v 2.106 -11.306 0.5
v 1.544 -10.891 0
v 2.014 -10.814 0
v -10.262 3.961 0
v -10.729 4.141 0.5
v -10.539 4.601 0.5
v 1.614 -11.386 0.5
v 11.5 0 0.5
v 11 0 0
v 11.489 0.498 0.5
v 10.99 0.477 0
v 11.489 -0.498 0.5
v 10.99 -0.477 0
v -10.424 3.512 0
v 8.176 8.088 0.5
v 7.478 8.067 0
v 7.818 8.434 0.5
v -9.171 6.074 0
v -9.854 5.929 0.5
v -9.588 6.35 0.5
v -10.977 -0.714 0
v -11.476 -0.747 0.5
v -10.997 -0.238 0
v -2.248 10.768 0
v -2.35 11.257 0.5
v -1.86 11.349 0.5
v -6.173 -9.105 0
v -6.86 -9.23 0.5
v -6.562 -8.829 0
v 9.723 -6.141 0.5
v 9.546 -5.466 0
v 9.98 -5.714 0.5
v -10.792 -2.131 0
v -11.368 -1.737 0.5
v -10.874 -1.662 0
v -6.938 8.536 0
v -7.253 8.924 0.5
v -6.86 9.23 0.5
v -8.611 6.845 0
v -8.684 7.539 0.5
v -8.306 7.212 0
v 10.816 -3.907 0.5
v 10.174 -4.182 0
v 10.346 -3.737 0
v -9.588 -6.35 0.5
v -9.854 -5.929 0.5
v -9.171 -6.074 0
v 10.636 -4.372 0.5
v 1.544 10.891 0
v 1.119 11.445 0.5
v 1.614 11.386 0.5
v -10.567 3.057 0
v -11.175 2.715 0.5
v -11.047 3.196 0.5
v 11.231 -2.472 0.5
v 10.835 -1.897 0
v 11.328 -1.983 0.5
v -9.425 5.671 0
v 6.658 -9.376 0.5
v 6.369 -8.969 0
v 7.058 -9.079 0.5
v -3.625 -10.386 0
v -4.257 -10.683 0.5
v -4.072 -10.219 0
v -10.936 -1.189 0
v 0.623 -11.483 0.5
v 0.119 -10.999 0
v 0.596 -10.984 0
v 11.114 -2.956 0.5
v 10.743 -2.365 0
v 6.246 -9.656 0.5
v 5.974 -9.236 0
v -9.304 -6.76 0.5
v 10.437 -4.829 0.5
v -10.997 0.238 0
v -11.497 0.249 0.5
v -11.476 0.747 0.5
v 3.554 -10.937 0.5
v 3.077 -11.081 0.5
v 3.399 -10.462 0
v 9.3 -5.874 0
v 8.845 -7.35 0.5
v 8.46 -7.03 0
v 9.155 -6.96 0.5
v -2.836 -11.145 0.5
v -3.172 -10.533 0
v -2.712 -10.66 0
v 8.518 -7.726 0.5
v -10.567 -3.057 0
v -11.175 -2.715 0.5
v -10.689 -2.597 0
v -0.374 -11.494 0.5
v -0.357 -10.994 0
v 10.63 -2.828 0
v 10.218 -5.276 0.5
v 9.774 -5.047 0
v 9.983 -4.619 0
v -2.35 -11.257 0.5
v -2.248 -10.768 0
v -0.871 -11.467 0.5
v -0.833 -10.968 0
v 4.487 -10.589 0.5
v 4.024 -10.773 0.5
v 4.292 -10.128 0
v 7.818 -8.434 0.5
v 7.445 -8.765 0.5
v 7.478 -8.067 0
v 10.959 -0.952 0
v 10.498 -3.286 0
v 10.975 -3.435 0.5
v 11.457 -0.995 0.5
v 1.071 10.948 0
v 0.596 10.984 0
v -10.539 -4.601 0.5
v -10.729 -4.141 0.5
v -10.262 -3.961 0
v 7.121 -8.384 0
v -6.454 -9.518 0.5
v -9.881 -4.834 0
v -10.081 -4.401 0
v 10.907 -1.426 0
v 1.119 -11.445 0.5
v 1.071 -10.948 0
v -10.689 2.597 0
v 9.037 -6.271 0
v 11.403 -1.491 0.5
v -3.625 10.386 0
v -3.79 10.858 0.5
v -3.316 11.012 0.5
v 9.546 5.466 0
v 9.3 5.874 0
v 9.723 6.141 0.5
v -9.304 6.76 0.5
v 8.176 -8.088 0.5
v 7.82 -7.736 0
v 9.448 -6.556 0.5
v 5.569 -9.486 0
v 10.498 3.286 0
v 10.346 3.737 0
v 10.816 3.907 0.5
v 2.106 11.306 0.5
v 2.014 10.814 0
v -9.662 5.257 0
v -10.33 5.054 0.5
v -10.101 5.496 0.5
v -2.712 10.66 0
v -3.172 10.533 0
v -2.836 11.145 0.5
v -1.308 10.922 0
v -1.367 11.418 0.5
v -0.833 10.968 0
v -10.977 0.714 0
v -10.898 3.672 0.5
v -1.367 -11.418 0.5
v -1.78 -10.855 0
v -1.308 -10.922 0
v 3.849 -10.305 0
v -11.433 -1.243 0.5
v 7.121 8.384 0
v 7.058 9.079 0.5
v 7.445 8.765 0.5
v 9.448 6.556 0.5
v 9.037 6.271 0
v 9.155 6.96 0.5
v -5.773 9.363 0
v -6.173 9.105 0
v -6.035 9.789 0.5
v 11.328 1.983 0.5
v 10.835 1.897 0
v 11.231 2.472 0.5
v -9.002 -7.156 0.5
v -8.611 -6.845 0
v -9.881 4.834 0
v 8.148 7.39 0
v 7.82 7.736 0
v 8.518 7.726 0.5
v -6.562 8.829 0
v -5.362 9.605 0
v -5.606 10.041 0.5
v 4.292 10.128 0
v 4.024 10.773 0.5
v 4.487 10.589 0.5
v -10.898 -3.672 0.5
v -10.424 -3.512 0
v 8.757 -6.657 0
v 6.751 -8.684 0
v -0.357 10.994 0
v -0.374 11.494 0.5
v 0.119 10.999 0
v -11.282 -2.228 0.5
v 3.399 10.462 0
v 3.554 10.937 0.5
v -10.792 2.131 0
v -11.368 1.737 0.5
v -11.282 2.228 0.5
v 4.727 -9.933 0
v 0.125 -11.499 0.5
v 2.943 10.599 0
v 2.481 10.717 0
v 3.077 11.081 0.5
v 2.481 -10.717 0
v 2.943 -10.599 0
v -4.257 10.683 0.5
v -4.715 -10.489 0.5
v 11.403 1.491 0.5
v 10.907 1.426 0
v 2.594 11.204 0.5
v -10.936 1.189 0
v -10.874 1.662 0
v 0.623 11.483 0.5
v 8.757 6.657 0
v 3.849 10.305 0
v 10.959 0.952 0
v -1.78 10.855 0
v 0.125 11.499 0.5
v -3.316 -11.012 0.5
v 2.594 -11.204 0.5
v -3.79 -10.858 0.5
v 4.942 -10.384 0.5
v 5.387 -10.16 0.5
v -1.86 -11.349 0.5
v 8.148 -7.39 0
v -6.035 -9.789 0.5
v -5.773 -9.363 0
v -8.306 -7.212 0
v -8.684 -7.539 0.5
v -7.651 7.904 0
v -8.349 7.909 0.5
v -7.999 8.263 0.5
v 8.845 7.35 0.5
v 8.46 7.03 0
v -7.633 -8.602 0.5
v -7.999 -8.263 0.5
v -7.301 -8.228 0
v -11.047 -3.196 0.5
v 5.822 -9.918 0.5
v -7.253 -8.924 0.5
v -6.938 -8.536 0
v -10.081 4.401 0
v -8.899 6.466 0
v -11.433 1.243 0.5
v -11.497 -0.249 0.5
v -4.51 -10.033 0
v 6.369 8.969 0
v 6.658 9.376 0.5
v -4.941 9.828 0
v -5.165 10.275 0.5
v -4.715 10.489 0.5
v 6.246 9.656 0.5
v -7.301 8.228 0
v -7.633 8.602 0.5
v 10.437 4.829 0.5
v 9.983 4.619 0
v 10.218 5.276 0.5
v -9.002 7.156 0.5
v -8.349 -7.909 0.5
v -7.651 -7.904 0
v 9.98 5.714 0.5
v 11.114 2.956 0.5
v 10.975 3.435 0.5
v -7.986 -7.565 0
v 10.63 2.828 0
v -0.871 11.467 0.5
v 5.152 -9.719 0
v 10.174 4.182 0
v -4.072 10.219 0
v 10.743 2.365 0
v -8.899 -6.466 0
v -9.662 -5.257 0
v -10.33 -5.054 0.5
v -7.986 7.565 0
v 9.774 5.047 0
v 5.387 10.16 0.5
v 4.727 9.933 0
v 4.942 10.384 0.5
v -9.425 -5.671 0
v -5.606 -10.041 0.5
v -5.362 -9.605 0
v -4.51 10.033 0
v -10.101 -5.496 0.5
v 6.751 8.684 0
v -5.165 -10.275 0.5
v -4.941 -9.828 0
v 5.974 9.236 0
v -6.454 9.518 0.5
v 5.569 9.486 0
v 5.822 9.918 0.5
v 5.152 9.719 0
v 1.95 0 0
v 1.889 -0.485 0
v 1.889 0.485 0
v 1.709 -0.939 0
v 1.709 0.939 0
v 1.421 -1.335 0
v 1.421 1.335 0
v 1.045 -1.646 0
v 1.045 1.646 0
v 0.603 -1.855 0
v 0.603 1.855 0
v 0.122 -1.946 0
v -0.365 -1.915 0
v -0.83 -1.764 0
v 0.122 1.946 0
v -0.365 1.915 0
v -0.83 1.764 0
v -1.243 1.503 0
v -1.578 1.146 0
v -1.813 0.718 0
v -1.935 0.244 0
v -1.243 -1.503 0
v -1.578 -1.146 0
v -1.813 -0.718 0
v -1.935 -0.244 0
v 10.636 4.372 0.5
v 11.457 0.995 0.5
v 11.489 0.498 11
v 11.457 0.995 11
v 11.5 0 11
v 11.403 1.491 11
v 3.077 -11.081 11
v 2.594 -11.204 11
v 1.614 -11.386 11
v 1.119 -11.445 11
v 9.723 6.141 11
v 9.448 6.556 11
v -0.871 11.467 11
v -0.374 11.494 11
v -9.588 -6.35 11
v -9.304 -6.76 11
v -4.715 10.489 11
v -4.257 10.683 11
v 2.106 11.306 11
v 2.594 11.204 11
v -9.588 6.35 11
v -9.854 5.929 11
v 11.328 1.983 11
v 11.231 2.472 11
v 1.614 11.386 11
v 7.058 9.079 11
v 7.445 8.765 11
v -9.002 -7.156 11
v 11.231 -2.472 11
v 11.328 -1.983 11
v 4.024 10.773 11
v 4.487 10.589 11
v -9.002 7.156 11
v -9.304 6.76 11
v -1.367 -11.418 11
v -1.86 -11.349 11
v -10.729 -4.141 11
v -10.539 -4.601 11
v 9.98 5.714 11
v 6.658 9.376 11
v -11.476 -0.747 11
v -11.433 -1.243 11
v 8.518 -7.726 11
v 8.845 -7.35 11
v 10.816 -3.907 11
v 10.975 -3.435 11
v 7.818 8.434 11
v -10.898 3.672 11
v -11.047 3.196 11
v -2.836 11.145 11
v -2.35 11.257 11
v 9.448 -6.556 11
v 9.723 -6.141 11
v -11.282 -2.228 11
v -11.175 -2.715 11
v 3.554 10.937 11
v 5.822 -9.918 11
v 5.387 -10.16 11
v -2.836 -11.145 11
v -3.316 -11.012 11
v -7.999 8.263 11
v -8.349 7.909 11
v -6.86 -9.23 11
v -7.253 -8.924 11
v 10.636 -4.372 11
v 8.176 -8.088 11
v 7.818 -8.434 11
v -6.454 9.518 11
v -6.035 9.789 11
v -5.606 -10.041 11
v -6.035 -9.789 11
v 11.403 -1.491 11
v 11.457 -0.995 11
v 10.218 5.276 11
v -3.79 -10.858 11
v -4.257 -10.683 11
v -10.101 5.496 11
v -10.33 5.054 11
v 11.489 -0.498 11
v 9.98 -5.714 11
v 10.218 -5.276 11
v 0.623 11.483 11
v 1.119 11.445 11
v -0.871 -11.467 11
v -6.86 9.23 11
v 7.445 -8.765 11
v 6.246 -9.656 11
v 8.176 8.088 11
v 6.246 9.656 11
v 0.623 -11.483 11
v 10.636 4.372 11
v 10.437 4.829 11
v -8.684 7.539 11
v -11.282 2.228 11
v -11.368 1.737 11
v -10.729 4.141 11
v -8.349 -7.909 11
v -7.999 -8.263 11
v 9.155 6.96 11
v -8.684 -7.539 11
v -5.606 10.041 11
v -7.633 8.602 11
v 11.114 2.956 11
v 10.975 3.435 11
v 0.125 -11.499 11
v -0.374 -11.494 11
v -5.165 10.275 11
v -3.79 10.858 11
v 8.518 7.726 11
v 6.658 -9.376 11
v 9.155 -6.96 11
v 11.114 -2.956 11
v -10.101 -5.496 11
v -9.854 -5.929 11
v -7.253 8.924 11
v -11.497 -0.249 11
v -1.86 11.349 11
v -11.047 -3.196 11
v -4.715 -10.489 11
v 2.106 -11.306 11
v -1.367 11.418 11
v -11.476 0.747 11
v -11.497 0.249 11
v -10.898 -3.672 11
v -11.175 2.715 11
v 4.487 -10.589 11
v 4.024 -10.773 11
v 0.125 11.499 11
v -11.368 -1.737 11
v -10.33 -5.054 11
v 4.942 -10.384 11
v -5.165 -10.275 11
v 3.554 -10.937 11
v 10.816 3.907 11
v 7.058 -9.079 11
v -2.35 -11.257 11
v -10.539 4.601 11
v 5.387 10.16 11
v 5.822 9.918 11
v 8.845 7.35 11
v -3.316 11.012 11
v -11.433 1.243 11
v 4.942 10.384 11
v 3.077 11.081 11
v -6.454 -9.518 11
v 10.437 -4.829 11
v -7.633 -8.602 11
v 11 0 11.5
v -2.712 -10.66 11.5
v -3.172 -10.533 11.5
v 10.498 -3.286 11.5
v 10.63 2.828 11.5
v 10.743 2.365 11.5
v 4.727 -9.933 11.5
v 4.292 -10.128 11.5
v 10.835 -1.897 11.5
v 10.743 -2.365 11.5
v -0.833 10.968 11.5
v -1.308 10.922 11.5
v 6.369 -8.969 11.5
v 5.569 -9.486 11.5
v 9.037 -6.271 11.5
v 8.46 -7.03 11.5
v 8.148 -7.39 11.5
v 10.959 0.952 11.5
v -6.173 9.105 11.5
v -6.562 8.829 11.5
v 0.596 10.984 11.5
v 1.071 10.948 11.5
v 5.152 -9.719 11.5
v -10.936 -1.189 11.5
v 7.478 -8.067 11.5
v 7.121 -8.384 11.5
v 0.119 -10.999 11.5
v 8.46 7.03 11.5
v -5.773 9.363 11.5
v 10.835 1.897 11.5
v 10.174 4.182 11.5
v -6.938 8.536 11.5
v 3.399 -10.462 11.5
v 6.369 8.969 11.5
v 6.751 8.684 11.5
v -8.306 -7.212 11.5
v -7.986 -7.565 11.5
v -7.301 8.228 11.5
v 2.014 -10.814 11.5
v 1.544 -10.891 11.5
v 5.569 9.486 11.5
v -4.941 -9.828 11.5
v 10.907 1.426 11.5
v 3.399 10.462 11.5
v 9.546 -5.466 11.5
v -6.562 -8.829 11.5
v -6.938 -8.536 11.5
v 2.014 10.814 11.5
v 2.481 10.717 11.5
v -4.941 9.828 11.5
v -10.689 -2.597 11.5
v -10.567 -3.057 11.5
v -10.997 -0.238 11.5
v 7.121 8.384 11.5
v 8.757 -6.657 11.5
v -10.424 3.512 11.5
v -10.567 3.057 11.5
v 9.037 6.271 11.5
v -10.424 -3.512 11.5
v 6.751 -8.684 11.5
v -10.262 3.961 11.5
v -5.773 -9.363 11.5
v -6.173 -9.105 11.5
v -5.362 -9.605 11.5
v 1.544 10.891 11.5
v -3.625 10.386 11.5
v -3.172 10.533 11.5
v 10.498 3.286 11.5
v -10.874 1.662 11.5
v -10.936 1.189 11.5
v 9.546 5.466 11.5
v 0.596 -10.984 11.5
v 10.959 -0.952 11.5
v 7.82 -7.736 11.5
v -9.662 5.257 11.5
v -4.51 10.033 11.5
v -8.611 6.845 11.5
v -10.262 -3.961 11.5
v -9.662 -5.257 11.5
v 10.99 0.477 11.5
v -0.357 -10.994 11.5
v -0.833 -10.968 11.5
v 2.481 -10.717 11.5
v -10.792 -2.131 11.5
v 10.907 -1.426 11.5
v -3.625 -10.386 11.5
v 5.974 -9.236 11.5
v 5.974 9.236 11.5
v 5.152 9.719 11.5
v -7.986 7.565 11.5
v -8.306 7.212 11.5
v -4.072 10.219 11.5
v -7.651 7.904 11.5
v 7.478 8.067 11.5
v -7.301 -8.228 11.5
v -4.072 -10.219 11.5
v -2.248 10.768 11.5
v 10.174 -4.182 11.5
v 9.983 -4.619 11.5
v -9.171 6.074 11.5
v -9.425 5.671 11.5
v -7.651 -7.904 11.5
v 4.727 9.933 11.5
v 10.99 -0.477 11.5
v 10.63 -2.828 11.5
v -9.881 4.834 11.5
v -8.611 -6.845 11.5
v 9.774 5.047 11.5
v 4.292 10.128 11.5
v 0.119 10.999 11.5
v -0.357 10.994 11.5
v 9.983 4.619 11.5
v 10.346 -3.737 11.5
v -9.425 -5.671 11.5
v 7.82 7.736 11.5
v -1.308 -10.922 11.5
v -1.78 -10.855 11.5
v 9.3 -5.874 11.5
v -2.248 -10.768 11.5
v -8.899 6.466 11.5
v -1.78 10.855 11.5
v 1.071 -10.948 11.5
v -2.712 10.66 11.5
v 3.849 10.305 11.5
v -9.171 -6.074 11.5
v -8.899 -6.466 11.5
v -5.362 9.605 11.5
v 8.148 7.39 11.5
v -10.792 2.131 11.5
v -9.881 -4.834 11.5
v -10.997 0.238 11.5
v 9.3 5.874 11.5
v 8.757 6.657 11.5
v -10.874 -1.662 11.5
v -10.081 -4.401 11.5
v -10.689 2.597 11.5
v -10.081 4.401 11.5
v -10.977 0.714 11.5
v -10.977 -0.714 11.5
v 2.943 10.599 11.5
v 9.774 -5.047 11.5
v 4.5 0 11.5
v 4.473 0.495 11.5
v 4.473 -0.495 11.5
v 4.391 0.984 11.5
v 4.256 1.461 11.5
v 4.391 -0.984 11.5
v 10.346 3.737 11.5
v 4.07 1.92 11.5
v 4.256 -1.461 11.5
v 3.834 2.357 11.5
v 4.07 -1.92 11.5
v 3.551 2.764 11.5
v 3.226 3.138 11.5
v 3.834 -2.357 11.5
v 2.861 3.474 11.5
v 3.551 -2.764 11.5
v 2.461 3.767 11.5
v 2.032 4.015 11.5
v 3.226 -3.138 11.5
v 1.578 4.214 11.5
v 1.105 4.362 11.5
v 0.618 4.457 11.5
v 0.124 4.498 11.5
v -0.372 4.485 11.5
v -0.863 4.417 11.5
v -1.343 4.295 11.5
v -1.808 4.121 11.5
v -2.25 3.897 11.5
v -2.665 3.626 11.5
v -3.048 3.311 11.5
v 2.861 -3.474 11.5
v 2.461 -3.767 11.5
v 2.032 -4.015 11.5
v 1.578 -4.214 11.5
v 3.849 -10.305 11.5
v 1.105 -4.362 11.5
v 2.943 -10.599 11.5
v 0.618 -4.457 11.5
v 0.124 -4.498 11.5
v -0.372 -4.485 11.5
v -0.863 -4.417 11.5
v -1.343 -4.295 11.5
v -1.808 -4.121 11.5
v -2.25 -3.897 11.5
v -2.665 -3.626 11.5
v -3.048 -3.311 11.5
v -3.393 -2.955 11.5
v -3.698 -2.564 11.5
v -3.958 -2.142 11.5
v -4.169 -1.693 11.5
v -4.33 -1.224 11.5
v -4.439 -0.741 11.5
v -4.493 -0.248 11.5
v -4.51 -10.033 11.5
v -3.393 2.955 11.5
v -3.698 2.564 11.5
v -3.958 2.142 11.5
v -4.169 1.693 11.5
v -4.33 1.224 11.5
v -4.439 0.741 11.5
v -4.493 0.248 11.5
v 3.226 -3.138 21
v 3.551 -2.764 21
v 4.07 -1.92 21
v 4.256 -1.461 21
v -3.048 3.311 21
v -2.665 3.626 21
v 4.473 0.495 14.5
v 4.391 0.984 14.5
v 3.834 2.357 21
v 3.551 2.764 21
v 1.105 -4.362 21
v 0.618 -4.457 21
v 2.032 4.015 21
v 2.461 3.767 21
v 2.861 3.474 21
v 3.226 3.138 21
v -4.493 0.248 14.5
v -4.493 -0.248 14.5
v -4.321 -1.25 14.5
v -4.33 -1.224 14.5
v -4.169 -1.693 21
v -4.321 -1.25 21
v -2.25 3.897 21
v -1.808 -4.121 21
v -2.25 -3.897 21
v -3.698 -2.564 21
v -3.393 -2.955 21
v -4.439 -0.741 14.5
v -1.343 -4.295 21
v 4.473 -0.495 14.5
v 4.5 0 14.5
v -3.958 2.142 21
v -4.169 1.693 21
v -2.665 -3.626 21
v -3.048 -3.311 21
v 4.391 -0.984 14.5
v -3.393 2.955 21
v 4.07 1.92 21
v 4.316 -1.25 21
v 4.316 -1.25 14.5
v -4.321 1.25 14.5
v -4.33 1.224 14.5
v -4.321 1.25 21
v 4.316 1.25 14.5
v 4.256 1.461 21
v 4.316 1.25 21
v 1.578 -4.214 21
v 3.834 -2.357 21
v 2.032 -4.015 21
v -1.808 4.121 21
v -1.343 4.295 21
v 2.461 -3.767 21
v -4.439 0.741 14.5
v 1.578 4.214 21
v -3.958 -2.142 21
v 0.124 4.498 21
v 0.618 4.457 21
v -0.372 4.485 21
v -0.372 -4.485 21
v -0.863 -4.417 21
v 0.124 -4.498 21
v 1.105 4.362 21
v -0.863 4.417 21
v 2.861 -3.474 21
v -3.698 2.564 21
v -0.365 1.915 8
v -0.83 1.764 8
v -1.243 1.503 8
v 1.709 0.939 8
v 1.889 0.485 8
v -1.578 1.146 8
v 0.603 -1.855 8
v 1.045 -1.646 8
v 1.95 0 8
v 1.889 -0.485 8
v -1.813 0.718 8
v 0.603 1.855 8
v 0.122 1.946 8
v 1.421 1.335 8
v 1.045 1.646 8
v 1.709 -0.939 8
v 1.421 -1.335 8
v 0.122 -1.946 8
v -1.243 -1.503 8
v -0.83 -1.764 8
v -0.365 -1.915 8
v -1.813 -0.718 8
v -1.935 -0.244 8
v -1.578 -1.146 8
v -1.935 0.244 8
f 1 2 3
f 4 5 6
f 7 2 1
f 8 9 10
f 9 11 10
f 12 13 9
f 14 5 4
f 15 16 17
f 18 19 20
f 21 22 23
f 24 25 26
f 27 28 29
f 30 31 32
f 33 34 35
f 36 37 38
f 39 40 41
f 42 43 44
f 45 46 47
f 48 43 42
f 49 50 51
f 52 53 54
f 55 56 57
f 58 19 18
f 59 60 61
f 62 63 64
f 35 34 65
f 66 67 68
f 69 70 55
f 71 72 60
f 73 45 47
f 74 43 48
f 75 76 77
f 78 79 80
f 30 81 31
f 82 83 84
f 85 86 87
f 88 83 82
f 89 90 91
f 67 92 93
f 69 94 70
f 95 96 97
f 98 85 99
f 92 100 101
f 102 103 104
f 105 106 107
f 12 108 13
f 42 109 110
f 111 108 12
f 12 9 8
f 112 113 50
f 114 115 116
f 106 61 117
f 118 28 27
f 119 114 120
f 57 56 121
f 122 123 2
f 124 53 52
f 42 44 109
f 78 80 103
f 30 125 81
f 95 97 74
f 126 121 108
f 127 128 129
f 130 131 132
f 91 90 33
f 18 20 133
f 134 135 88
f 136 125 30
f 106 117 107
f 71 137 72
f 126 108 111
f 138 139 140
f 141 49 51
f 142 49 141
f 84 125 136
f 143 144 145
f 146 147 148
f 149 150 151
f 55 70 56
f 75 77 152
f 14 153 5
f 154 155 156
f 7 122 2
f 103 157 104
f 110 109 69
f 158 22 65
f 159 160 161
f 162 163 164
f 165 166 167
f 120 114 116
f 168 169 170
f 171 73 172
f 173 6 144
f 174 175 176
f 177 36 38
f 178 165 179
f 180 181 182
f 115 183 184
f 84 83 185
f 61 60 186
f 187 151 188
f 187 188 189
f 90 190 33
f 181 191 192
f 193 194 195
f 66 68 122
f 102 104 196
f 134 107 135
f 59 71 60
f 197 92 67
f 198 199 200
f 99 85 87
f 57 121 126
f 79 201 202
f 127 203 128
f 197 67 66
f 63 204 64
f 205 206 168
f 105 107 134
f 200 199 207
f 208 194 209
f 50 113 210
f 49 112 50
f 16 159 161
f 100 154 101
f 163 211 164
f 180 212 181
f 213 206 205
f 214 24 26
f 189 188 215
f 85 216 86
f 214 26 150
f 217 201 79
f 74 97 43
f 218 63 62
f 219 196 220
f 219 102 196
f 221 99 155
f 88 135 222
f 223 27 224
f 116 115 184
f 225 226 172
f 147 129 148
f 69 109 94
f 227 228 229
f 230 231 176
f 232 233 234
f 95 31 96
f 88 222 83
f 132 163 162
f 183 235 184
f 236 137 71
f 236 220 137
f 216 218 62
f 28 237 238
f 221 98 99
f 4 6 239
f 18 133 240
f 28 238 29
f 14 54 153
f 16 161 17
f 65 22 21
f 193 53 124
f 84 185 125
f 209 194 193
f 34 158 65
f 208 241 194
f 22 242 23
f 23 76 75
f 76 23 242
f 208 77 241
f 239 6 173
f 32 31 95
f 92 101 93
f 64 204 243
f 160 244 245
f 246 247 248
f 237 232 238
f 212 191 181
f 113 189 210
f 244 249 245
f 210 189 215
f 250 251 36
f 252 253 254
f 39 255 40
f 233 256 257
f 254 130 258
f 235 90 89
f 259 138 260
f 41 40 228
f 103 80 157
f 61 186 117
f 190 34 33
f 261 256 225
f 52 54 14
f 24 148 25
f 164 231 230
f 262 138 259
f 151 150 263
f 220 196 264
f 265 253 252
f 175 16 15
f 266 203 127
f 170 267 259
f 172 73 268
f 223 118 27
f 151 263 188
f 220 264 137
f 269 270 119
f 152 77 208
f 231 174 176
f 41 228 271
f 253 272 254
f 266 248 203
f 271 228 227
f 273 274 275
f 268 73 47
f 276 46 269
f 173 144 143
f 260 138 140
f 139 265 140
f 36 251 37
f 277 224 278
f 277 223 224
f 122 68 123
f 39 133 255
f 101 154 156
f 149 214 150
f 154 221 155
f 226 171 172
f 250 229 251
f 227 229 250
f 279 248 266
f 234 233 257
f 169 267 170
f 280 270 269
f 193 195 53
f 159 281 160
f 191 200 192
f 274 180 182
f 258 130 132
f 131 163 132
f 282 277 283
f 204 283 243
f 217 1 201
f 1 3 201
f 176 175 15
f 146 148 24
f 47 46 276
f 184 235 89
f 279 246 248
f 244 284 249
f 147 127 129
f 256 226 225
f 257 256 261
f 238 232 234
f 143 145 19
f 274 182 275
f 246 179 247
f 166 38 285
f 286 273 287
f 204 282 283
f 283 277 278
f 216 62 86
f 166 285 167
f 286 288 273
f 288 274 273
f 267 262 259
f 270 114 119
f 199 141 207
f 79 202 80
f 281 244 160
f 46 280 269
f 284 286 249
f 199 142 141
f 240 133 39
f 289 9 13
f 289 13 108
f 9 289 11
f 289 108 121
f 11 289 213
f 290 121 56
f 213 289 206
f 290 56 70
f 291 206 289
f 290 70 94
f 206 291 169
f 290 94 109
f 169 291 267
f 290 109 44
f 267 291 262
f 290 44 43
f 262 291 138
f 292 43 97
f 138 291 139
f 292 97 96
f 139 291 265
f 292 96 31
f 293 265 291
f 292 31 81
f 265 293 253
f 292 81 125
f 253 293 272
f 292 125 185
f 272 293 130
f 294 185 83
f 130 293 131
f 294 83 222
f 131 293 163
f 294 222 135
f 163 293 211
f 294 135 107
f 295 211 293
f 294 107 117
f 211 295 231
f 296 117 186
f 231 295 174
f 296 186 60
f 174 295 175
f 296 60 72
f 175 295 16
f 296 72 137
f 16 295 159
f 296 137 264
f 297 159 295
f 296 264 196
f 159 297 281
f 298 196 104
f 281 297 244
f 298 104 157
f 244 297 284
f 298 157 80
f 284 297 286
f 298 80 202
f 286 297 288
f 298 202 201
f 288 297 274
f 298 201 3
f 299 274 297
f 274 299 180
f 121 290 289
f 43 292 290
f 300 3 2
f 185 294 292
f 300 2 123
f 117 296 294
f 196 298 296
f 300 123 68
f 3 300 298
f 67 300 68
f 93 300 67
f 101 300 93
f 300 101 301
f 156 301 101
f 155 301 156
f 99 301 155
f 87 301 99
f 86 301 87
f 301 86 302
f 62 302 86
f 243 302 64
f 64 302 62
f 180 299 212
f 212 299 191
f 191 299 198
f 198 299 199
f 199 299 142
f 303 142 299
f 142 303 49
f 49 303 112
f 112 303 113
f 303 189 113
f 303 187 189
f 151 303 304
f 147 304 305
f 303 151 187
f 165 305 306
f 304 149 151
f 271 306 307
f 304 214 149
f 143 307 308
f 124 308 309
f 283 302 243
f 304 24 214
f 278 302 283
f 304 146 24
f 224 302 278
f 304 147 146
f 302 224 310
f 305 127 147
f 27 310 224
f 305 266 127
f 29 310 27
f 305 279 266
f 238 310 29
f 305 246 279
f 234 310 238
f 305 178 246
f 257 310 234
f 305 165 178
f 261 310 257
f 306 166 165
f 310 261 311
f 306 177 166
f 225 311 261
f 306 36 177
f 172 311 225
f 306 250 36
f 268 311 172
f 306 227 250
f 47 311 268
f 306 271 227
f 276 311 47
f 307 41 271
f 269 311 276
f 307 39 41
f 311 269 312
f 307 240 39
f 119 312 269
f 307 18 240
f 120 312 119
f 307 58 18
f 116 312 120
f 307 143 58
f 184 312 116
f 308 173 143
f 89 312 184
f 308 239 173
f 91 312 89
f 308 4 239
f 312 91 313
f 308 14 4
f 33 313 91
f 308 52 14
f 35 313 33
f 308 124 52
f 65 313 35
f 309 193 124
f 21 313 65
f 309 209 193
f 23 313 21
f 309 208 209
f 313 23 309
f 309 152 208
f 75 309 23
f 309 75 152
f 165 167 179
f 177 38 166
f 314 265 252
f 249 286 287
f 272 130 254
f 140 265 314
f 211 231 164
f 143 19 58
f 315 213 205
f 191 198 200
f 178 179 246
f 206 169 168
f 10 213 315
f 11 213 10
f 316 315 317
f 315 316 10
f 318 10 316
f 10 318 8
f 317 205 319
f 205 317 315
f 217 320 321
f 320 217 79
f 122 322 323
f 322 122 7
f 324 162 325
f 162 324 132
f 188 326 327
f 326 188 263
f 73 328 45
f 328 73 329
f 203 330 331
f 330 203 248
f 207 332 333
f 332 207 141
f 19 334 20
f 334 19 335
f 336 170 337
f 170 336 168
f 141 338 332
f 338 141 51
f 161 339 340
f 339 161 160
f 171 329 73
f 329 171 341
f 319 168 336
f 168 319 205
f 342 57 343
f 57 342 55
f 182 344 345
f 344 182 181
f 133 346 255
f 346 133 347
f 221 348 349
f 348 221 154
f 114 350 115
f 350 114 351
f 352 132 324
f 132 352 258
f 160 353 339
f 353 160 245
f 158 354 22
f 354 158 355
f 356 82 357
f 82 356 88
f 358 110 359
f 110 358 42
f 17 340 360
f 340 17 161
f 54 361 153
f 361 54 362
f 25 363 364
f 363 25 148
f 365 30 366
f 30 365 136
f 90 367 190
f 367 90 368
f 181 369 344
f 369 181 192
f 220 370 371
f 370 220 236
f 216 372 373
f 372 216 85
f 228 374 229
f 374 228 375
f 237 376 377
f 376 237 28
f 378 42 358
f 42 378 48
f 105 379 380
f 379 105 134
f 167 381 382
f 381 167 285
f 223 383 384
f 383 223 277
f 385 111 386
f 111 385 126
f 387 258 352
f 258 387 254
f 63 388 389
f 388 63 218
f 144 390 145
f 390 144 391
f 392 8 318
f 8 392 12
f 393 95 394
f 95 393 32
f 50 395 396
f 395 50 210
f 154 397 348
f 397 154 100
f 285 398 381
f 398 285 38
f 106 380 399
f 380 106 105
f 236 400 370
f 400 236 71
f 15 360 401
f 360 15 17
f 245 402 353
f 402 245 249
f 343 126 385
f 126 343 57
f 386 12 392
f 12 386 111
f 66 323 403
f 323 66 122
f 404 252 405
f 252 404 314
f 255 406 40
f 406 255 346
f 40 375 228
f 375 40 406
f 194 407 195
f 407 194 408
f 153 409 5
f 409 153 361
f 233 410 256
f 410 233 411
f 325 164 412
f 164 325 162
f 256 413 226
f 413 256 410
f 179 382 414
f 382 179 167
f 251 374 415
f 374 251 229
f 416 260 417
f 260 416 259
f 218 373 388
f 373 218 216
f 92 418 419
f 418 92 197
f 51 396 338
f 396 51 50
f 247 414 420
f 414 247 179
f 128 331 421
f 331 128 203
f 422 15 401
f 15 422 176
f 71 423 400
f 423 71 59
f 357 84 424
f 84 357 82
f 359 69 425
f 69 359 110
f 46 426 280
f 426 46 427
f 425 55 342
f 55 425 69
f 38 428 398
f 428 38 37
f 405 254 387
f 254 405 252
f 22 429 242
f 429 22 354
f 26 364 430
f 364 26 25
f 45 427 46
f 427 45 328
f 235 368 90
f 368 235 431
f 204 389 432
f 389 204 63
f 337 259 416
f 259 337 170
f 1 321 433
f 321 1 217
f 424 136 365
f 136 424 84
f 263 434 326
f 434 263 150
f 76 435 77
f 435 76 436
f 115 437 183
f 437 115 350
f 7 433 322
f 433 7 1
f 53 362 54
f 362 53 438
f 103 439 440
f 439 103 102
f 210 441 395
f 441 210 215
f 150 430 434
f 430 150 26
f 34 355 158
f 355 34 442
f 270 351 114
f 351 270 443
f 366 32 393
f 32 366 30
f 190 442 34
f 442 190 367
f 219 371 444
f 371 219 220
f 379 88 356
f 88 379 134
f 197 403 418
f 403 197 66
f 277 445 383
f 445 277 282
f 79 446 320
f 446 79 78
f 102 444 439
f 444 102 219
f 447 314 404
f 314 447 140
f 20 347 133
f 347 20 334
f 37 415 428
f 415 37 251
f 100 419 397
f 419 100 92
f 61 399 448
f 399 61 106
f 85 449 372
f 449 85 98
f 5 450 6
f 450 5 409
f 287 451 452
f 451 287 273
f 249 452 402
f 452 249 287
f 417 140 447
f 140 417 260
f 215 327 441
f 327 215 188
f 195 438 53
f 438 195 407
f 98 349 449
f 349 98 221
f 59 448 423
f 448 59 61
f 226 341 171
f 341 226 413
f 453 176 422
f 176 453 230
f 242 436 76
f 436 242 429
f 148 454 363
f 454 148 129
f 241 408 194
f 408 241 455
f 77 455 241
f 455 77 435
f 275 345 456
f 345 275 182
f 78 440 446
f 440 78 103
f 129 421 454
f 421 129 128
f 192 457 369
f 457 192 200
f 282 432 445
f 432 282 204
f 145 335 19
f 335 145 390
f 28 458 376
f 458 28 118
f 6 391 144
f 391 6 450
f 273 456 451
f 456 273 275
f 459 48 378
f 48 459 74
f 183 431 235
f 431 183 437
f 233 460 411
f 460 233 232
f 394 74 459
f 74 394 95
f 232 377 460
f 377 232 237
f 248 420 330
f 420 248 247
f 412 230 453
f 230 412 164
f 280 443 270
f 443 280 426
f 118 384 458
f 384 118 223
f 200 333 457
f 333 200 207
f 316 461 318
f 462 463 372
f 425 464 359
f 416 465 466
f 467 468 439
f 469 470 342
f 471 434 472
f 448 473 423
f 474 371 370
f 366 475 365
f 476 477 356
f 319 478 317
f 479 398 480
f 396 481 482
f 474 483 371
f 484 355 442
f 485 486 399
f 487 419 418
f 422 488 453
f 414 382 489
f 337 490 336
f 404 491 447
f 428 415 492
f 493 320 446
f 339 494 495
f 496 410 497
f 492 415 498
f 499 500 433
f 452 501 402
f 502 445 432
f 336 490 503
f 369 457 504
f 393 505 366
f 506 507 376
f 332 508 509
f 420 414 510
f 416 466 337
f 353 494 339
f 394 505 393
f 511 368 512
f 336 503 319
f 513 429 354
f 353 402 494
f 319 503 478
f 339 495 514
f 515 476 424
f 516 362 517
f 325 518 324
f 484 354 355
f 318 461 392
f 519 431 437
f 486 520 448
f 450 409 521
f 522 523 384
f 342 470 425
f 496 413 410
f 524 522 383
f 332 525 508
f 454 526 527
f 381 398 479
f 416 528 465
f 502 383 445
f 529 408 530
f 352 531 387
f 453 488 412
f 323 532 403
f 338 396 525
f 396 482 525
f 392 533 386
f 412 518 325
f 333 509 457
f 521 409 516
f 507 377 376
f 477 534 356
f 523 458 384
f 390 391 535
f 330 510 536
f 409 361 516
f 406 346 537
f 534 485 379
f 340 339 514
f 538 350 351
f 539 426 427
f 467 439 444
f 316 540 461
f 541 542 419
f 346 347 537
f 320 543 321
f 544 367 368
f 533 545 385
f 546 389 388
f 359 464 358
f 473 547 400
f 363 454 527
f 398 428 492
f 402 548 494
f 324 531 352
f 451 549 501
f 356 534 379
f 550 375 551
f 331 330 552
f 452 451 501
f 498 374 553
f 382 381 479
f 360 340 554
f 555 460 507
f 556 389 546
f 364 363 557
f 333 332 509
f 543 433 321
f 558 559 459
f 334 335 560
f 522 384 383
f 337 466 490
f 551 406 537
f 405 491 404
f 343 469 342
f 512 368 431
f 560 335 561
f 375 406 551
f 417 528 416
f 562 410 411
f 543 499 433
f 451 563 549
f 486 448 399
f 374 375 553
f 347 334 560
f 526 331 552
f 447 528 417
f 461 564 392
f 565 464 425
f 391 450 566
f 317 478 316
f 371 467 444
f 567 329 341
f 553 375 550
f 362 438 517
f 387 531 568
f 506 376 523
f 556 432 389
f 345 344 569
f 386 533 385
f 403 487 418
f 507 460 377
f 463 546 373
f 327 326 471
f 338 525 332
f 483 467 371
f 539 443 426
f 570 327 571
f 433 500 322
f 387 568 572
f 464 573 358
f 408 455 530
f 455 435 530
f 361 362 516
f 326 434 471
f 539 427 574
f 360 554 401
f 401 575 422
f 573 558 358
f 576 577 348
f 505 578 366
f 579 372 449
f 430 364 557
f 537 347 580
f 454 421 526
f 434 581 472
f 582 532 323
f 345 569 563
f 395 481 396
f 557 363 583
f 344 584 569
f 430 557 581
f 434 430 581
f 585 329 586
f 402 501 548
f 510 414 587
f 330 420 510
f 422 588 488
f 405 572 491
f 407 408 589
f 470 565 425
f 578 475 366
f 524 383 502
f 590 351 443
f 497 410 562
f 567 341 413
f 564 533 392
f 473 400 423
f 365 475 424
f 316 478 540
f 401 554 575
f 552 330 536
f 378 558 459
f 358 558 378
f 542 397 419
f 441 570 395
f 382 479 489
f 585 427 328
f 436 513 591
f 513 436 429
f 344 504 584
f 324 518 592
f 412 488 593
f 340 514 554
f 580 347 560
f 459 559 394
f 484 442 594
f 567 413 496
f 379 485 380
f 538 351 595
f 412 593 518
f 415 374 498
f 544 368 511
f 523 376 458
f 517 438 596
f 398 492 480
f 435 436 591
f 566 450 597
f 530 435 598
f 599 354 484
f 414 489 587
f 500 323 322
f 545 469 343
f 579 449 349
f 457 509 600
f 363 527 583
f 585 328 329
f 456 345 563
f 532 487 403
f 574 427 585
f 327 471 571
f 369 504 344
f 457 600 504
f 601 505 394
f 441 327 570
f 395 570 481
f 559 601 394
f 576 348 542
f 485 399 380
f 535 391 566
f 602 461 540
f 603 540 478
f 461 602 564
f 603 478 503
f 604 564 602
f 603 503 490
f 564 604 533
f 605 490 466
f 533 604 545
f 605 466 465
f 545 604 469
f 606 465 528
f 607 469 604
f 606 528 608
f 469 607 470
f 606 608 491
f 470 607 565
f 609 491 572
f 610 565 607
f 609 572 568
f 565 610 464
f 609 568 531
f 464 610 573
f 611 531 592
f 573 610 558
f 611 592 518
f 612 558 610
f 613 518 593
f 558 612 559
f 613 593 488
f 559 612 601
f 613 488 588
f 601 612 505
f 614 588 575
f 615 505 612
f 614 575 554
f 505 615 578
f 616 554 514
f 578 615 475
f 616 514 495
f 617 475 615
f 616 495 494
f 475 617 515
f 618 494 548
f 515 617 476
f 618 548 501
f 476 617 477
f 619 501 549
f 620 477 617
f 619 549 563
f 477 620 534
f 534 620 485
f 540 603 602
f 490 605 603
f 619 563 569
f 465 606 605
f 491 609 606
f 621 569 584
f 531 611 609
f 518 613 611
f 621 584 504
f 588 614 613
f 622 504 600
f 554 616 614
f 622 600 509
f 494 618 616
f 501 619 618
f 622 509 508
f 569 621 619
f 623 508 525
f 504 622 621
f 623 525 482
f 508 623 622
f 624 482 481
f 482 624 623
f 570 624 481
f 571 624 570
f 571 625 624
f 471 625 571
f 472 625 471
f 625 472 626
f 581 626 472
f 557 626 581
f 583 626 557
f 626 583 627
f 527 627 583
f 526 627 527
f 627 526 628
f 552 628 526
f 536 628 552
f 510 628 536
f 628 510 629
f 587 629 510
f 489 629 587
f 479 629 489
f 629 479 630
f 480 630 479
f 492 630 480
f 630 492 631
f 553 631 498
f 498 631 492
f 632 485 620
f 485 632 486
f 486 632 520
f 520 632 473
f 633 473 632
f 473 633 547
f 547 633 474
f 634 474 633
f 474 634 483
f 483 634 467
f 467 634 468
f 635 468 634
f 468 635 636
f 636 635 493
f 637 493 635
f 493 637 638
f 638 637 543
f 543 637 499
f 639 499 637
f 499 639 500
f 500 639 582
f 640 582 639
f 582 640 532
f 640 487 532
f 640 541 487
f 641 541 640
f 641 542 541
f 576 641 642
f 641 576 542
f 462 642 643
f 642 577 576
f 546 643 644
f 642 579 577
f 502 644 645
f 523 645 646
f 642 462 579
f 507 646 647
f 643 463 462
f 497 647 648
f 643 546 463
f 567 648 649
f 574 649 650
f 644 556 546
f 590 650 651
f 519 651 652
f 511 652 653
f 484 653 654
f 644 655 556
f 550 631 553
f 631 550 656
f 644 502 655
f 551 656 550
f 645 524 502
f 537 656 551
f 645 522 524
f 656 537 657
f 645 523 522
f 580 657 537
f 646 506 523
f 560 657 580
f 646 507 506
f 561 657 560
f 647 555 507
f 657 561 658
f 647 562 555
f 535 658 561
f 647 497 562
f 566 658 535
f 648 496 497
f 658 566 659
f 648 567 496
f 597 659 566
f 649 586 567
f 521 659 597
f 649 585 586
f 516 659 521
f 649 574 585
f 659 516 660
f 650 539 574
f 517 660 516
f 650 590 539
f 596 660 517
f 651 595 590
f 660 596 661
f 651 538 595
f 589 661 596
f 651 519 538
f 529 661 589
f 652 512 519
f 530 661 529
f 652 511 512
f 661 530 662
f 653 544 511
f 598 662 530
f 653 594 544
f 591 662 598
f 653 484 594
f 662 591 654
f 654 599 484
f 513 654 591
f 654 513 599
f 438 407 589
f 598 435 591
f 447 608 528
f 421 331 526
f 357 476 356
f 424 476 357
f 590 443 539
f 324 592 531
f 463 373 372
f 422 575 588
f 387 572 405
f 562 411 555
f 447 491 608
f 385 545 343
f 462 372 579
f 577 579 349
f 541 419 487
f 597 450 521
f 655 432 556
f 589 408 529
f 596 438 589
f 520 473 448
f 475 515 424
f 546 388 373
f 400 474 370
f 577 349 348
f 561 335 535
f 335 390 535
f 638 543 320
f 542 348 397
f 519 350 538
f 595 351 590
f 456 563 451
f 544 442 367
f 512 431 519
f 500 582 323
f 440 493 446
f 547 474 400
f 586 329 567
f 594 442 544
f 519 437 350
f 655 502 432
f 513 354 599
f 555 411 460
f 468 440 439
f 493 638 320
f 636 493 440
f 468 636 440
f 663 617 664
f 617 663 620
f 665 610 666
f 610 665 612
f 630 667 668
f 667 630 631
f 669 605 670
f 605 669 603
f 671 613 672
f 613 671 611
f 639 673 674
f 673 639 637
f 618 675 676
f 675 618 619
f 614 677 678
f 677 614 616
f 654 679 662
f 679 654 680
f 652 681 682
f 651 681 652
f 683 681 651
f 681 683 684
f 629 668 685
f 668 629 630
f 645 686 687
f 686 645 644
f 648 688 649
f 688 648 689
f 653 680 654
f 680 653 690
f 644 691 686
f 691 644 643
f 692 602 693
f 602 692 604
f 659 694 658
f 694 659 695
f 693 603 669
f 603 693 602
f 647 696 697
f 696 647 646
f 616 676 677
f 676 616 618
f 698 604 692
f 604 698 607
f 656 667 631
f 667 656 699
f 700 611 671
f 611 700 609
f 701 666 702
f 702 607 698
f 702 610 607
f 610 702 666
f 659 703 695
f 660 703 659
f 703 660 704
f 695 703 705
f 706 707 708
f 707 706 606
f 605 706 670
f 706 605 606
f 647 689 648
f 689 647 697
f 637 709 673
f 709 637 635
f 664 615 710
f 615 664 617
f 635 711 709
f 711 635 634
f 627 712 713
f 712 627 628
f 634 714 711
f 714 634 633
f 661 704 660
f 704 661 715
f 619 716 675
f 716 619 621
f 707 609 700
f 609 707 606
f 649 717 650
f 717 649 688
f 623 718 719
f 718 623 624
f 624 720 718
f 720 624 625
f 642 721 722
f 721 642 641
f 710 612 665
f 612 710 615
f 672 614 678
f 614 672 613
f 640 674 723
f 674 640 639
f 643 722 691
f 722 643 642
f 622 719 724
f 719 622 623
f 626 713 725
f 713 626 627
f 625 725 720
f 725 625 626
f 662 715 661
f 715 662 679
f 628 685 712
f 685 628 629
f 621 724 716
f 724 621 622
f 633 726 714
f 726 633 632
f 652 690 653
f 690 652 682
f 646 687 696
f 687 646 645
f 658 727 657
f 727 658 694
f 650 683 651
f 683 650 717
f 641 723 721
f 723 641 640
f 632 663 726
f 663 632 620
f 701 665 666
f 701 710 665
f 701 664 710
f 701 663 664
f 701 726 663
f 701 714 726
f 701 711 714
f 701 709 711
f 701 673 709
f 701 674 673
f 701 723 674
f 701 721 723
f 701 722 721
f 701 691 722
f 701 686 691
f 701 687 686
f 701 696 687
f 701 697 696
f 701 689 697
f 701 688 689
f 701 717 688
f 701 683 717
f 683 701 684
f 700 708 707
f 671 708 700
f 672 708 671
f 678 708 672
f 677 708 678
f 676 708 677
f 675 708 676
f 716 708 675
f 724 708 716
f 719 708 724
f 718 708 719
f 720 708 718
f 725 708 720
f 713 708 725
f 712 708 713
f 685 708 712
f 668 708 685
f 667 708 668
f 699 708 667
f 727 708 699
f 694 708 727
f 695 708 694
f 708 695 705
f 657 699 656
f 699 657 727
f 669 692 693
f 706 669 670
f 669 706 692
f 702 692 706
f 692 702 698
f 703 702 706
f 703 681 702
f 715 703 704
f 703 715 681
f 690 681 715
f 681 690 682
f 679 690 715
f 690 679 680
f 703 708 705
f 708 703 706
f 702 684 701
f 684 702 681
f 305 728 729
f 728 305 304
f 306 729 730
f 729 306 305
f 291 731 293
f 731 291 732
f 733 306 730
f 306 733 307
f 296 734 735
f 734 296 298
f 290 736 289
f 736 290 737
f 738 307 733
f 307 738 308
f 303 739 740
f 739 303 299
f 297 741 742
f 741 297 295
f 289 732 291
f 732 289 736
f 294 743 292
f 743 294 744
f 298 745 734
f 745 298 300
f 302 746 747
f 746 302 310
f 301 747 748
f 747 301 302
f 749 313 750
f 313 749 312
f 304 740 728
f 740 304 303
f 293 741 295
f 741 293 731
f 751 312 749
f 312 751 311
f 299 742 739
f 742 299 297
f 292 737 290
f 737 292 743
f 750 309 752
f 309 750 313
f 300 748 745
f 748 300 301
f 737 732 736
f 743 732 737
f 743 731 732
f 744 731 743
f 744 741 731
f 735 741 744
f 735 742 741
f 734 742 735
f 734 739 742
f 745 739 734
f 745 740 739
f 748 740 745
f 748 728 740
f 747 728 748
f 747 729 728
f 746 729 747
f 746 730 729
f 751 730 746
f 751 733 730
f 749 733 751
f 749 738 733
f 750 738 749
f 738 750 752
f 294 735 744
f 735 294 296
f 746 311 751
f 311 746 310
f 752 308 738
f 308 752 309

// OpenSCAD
od1=23/2 ; //baseouter diamter
h1=11.5 ; //base height
od2 = 9/2 ; //shaft diameter
h2= 21; //shaft height
dr=0.1;
x1 = 10 ;
y1 = 2.5 ;
z1= 6.5;
pind=3.9/2;
chamfer=0.5;
difference(){
difference()
{
   union(){ 
    cylinder (chamfer,  od1-chamfer , od1 , false,$fa=1, $fs=0.5);   
   translate([0,0,chamfer]) cylinder (h1-2*chamfer,  od1 , od1 , false,$fa=1, $fs=0.5);
       translate([0,0,h1-chamfer]) cylinder (chamfer,  od1 , od1-chamfer , false,$fa=1, $fs=0.5);
    cylinder (h2,  od2 , od2 , false,$fa=1, $fs=0.5);
   }
   
    translate ( [-x1/2 , -y1/2 ,h2-z1])  cube([x1,y1,z1]);

}
cylinder (8,pind,pind, false,$fa=1, $fs=0.5);
}
